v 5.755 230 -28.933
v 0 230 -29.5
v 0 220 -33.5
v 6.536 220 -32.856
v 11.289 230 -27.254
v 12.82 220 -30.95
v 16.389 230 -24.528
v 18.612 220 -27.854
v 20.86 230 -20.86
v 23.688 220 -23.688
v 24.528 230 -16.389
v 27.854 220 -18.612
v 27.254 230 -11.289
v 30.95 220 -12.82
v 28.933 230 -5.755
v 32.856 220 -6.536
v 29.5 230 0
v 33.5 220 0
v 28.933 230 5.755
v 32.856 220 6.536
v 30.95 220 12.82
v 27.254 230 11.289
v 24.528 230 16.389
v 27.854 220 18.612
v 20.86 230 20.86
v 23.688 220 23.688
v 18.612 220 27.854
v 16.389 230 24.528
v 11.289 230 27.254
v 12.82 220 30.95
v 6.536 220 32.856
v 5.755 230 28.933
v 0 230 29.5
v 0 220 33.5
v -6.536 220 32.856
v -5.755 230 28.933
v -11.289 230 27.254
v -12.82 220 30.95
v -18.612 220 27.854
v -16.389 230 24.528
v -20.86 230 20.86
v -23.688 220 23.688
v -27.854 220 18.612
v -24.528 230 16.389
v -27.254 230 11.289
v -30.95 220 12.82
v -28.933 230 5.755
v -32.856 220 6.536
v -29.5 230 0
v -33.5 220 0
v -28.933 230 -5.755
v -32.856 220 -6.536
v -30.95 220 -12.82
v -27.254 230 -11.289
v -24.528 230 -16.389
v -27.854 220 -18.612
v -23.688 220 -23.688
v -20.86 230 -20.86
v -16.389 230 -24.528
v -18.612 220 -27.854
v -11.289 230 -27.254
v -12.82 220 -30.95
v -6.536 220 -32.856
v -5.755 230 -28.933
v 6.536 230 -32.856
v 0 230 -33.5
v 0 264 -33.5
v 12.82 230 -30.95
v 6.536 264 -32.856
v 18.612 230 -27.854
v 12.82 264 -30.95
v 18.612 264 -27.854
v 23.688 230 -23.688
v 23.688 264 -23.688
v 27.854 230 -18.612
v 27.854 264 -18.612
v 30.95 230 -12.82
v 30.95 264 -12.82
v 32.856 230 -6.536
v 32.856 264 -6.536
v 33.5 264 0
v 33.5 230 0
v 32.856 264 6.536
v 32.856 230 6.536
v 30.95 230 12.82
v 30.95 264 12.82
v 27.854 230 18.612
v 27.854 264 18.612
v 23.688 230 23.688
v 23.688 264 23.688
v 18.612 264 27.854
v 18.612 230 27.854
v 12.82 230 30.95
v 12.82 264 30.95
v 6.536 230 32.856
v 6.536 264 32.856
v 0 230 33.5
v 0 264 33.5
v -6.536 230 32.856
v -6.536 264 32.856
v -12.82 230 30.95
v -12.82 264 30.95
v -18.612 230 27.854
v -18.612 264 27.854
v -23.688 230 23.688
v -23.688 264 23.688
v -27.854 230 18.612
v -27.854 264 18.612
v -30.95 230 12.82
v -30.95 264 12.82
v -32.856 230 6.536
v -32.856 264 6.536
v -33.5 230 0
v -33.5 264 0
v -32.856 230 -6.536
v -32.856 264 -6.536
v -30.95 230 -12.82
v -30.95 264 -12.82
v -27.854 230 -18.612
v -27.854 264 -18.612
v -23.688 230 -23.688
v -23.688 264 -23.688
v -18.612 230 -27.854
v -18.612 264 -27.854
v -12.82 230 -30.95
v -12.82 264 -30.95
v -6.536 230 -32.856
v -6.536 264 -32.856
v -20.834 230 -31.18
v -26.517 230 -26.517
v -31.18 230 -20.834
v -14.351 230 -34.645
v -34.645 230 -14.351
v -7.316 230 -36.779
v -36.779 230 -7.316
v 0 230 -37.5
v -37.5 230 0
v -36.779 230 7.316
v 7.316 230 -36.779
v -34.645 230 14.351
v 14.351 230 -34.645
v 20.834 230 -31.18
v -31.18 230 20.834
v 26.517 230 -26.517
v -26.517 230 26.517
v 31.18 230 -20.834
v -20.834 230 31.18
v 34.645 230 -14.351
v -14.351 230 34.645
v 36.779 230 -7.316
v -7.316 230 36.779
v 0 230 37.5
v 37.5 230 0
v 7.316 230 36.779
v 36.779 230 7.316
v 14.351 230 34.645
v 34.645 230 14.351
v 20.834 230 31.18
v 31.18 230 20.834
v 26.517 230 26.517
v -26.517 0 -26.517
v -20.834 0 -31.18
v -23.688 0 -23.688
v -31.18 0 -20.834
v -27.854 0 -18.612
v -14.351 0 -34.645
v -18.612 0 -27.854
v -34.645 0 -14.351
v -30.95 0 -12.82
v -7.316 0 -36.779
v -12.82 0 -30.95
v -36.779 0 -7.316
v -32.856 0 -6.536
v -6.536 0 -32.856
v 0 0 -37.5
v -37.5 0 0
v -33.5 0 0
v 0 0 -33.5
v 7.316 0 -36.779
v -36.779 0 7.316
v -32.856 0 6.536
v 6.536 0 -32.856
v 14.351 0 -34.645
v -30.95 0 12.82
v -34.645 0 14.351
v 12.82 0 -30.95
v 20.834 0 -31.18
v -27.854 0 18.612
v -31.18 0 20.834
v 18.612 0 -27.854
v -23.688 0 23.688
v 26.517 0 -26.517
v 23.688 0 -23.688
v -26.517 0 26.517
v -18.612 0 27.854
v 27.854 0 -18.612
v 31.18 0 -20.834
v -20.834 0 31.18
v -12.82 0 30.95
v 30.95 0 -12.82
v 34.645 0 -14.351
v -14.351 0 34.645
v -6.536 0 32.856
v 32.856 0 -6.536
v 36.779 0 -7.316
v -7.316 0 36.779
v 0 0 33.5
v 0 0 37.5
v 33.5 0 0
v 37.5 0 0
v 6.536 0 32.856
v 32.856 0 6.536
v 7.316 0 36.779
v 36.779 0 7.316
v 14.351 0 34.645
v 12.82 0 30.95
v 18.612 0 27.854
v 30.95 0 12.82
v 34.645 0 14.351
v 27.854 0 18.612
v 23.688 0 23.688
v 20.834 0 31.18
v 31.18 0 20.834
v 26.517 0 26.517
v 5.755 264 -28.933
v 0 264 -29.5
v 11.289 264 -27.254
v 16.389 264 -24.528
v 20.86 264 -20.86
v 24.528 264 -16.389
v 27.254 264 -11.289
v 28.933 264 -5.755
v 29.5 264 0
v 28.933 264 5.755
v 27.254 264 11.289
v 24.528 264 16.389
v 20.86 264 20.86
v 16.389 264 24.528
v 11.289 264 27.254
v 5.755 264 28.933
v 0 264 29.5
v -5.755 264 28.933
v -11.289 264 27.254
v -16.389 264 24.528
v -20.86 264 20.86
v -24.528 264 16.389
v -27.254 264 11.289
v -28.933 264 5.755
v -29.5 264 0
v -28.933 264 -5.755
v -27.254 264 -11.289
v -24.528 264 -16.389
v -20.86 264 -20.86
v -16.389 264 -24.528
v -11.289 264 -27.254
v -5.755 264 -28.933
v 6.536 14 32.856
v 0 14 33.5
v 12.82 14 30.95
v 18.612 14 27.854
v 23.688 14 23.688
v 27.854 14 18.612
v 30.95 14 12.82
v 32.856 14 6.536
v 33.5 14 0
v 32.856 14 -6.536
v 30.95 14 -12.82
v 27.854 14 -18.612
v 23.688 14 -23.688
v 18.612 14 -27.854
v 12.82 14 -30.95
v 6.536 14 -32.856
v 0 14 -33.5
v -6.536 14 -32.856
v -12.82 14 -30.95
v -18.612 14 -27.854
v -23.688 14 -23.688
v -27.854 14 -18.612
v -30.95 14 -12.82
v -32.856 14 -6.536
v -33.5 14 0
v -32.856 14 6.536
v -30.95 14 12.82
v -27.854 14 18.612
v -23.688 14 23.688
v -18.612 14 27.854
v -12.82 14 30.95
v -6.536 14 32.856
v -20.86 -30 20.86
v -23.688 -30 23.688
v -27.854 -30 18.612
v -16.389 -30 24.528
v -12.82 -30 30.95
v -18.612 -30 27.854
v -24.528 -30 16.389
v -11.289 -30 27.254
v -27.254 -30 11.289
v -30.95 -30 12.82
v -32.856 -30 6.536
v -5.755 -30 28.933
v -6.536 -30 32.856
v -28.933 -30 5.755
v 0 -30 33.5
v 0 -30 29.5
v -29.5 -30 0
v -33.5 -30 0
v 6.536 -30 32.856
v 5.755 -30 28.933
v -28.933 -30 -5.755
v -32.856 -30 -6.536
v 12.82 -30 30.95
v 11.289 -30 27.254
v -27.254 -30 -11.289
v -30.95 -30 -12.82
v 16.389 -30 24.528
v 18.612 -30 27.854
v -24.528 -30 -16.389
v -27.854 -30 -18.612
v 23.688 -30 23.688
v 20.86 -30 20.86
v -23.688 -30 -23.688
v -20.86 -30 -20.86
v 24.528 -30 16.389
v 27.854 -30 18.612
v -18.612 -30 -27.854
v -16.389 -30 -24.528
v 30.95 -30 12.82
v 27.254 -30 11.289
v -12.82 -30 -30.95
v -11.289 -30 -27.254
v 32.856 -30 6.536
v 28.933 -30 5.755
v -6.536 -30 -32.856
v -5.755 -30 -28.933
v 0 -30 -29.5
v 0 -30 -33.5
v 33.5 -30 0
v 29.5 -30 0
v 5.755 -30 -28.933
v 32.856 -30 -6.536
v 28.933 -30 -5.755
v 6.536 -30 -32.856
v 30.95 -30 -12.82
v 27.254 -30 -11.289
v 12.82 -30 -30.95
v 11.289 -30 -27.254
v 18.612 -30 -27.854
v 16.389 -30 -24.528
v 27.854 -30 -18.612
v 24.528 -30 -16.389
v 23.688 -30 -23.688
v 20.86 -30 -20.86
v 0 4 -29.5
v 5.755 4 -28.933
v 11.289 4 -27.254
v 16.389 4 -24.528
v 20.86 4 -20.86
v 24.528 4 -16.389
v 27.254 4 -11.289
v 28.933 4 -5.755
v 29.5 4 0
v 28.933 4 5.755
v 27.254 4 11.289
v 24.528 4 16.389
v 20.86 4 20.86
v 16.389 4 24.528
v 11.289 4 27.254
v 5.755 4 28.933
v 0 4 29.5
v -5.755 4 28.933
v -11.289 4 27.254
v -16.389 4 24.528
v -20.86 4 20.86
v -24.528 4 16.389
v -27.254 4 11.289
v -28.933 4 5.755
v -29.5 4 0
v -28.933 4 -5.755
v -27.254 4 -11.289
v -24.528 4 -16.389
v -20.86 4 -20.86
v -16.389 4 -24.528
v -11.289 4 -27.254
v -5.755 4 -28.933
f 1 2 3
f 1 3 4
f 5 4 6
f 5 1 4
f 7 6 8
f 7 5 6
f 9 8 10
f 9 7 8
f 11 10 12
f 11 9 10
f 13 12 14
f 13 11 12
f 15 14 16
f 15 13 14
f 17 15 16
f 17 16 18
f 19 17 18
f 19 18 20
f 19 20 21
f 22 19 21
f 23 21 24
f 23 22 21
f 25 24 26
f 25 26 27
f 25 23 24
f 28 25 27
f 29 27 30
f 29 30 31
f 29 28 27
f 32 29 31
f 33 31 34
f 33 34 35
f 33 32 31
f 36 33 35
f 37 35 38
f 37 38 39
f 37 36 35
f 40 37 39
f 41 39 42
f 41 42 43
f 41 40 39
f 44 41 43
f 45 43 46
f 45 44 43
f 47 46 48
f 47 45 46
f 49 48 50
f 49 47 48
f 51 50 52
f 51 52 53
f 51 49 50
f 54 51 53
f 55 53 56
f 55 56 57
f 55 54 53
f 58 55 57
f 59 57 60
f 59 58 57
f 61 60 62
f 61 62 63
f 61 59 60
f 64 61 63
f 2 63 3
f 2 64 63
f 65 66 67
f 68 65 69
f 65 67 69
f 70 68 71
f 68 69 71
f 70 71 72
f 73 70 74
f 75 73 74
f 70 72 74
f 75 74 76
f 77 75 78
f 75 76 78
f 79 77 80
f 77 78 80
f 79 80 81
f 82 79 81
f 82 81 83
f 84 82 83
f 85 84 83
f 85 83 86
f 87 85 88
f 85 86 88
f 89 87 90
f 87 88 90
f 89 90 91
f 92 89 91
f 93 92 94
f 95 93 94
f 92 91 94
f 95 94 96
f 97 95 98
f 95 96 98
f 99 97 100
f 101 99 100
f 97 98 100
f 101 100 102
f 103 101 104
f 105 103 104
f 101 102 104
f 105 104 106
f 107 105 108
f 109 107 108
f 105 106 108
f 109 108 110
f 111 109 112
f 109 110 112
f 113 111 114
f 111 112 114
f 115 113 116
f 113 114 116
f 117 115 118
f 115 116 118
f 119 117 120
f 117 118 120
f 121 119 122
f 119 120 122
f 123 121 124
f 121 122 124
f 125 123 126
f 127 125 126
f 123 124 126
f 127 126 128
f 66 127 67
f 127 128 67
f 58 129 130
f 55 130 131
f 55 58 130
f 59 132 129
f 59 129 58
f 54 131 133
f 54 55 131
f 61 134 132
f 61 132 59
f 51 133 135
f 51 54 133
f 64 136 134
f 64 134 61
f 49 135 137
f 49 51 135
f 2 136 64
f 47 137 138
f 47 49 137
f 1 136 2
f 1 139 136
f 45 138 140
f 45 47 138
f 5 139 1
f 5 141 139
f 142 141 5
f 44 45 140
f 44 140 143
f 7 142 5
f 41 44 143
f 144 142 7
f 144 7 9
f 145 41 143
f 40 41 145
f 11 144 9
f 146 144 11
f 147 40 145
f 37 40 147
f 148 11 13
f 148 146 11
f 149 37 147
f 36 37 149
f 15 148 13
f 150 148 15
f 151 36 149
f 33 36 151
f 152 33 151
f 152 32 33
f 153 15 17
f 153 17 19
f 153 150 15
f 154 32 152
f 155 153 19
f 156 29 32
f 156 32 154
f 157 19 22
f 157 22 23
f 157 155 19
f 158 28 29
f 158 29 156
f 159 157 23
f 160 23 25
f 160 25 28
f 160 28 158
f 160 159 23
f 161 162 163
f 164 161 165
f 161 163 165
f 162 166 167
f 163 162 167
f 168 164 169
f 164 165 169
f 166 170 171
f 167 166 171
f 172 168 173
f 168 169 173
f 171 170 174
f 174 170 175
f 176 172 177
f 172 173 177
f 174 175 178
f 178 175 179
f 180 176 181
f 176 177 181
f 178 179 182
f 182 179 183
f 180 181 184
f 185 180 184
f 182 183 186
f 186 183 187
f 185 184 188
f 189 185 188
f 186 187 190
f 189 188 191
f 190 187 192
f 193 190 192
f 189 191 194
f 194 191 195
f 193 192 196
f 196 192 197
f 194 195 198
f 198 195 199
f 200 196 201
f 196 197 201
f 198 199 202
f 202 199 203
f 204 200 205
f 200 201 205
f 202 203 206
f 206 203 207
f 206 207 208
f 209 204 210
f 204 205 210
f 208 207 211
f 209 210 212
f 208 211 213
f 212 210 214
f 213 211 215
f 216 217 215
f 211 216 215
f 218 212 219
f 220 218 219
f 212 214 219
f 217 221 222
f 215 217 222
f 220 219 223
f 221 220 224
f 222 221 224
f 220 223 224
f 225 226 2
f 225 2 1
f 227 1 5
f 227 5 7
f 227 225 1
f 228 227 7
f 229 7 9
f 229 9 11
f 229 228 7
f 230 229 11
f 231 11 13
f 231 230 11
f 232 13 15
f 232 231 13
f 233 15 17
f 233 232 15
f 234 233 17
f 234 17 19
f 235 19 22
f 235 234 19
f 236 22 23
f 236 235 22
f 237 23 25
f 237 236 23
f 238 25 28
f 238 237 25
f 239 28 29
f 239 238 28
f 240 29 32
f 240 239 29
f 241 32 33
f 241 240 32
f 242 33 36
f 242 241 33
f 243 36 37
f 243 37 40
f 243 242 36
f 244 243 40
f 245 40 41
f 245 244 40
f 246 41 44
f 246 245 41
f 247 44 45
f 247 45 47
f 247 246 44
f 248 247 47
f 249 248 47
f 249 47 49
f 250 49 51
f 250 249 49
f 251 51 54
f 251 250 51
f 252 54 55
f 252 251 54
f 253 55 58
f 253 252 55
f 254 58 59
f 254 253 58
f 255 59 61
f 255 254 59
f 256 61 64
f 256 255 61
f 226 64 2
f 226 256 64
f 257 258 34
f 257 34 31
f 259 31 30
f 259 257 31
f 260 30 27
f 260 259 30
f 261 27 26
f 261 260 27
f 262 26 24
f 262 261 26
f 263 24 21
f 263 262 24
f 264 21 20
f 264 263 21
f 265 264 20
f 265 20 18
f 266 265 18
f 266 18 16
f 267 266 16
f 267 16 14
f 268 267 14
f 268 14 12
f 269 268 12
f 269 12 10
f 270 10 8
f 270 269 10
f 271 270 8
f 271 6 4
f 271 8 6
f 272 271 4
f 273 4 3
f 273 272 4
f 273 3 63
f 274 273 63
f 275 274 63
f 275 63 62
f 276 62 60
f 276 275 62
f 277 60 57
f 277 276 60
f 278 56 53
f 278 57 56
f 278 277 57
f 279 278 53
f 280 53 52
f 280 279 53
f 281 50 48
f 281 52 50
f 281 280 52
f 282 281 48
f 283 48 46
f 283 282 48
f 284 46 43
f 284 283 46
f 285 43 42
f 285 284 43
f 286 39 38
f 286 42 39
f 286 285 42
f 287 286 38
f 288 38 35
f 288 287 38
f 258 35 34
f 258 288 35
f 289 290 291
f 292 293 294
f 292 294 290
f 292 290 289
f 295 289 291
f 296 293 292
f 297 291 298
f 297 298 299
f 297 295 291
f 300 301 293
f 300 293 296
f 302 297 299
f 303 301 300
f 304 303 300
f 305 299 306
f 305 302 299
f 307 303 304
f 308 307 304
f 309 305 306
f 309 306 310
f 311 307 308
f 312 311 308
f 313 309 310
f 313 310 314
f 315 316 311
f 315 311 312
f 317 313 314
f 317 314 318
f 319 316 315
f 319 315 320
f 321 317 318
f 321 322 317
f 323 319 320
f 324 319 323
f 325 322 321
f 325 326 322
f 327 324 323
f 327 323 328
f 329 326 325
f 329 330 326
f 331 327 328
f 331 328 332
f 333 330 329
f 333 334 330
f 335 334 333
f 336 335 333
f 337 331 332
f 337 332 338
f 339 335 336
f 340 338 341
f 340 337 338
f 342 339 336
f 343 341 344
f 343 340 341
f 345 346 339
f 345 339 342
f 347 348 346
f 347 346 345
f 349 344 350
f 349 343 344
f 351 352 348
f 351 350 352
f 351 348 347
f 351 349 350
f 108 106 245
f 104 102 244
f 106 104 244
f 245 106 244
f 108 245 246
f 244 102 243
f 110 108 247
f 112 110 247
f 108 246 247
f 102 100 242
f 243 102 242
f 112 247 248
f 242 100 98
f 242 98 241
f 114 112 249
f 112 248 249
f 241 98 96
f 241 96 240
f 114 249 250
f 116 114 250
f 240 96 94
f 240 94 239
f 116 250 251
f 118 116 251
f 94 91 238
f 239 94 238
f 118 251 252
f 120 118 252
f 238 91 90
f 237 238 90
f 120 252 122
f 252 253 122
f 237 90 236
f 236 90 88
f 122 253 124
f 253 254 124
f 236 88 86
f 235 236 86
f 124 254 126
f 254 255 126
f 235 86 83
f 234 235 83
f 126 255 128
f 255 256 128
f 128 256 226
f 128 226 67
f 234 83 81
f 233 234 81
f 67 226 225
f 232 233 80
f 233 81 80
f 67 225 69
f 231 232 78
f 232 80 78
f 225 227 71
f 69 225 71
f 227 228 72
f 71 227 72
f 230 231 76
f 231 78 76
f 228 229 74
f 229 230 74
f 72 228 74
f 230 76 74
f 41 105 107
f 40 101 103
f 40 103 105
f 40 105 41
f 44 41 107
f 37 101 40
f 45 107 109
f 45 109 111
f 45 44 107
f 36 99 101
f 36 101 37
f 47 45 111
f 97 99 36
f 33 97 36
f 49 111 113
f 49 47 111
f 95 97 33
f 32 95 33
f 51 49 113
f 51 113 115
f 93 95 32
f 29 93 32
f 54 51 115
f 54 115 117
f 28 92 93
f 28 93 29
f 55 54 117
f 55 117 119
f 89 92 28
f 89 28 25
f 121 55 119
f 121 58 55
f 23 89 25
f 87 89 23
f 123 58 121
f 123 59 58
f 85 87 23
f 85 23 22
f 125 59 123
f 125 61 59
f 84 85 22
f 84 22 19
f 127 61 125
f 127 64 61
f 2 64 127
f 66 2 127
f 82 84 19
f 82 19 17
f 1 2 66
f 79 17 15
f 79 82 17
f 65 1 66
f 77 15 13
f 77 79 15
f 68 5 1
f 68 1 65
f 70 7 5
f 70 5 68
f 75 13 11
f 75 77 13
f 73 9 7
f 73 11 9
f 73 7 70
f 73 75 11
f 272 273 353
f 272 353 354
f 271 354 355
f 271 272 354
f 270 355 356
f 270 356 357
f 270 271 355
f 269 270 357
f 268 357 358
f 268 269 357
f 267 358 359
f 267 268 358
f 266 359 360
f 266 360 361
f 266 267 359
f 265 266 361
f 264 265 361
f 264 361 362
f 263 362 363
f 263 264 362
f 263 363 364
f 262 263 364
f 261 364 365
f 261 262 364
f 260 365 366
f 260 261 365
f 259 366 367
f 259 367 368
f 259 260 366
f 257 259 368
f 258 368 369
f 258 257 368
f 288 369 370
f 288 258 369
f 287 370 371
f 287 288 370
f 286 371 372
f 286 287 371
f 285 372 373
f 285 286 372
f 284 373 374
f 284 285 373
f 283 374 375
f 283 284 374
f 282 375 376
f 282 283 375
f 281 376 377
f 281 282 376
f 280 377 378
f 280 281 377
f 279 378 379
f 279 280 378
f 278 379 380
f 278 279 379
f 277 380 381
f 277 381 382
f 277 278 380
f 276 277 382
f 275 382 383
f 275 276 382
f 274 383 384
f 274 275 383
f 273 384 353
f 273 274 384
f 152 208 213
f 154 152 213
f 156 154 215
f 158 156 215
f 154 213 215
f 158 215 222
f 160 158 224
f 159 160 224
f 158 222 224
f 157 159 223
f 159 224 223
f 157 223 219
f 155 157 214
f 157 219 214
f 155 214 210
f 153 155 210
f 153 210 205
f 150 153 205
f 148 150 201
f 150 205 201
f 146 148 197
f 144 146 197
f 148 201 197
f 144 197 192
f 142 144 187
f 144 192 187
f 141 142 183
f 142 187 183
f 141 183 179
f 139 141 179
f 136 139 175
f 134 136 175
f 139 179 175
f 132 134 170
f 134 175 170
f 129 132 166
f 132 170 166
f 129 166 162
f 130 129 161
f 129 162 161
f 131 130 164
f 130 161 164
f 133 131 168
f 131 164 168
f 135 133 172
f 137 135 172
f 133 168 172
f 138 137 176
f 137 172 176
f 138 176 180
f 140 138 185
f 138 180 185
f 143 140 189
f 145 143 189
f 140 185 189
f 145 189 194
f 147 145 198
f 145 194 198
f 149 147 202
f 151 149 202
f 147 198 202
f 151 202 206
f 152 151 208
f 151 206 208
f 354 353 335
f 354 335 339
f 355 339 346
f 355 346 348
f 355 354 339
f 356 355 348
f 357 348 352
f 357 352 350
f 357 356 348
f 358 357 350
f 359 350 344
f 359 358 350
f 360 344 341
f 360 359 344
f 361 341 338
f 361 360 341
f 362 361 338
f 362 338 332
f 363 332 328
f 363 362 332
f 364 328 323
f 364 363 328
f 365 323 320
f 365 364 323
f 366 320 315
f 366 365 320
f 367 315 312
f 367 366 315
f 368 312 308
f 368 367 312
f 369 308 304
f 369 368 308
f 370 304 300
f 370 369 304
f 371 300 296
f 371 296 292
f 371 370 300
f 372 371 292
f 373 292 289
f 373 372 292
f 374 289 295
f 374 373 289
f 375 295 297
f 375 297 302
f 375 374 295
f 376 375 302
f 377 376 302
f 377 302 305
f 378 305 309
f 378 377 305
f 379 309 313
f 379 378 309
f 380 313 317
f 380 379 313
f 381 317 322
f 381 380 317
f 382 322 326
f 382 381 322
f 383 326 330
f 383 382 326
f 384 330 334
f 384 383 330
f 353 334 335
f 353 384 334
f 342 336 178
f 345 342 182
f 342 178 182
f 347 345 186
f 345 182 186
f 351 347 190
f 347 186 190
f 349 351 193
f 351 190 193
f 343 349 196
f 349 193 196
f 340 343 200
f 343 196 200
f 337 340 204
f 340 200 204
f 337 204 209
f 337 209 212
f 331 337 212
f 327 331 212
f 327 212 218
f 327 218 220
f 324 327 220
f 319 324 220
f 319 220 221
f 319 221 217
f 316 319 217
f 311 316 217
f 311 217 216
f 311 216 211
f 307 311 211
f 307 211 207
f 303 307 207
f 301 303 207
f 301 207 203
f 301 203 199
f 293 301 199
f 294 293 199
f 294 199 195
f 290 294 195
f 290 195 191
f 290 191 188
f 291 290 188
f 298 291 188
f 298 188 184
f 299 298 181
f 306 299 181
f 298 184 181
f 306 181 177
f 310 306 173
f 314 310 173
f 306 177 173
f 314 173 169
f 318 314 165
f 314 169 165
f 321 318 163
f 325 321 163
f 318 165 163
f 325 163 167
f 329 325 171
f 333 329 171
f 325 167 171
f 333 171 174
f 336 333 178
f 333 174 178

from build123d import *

# Parameters (mm, degrees)
SKETCH1_R                = 37.5
SKETCH1_R_2              = 33.5
BOSS_EXTRUDE1_DEPTH      = 230
BOSS_EXTRUDE2_DEPTH      = 30
BOSS_EXTRUDE2_DEPTH_BACK = 4
SKETCH2_R                = 33.5
SKETCH2_R_2              = 29.5
BOSS_EXTRUDE3_START      = -264
SKETCH2_2_R              = 33.5
SKETCH2_2_R_2            = 29.5
BOSS_EXTRUDE3_DEPTH      = 34


with BuildPart() as part:
    # Sketch1 → Boss-Extrude1 (new body)
    with BuildSketch(Plane(origin=(0, 0, 0), x_dir=(1, 0, 0), z_dir=(0, 1, 0))):
        Circle(SKETCH1_R)
        Circle(SKETCH1_R_2, mode=Mode.SUBTRACT)
    extrude(amount=BOSS_EXTRUDE1_DEPTH)

    # Sketch2 → Boss-Extrude2 (add, two sides: drawn at the far end of the back side and taken through both)
    with BuildSketch(Plane.XZ.offset(-BOSS_EXTRUDE2_DEPTH_BACK)):
        Circle(SKETCH2_R)
        Circle(SKETCH2_R_2, mode=Mode.SUBTRACT)
    extrude(amount=BOSS_EXTRUDE2_DEPTH + BOSS_EXTRUDE2_DEPTH_BACK)

    # Sketch3 → Revolve2 (revolve)
    with BuildSketch(Plane(origin=(0, 0, 0), x_dir=(0, 0, -1), z_dir=(1, 0, 0))):
        Polygon((-33.5, 220), (-29.5, 230), (-33.5, 230), align=None)
        Polygon((-29.5, 4), (-33.5, 14), (-33.5, 4), align=None)
    revolve(axis=Axis((0, 147.317017351, 0), (0, -1, 0)))


with BuildPart() as body_2:
    # Sketch2<2> → Boss-Extrude3 (new body)
    with BuildSketch(Plane.XZ.offset(BOSS_EXTRUDE3_START)):
        Circle(SKETCH2_2_R)
        Circle(SKETCH2_2_R_2, mode=Mode.SUBTRACT)
    extrude(amount=BOSS_EXTRUDE3_DEPTH)


solid = Compound([part.part, body_2.part])
